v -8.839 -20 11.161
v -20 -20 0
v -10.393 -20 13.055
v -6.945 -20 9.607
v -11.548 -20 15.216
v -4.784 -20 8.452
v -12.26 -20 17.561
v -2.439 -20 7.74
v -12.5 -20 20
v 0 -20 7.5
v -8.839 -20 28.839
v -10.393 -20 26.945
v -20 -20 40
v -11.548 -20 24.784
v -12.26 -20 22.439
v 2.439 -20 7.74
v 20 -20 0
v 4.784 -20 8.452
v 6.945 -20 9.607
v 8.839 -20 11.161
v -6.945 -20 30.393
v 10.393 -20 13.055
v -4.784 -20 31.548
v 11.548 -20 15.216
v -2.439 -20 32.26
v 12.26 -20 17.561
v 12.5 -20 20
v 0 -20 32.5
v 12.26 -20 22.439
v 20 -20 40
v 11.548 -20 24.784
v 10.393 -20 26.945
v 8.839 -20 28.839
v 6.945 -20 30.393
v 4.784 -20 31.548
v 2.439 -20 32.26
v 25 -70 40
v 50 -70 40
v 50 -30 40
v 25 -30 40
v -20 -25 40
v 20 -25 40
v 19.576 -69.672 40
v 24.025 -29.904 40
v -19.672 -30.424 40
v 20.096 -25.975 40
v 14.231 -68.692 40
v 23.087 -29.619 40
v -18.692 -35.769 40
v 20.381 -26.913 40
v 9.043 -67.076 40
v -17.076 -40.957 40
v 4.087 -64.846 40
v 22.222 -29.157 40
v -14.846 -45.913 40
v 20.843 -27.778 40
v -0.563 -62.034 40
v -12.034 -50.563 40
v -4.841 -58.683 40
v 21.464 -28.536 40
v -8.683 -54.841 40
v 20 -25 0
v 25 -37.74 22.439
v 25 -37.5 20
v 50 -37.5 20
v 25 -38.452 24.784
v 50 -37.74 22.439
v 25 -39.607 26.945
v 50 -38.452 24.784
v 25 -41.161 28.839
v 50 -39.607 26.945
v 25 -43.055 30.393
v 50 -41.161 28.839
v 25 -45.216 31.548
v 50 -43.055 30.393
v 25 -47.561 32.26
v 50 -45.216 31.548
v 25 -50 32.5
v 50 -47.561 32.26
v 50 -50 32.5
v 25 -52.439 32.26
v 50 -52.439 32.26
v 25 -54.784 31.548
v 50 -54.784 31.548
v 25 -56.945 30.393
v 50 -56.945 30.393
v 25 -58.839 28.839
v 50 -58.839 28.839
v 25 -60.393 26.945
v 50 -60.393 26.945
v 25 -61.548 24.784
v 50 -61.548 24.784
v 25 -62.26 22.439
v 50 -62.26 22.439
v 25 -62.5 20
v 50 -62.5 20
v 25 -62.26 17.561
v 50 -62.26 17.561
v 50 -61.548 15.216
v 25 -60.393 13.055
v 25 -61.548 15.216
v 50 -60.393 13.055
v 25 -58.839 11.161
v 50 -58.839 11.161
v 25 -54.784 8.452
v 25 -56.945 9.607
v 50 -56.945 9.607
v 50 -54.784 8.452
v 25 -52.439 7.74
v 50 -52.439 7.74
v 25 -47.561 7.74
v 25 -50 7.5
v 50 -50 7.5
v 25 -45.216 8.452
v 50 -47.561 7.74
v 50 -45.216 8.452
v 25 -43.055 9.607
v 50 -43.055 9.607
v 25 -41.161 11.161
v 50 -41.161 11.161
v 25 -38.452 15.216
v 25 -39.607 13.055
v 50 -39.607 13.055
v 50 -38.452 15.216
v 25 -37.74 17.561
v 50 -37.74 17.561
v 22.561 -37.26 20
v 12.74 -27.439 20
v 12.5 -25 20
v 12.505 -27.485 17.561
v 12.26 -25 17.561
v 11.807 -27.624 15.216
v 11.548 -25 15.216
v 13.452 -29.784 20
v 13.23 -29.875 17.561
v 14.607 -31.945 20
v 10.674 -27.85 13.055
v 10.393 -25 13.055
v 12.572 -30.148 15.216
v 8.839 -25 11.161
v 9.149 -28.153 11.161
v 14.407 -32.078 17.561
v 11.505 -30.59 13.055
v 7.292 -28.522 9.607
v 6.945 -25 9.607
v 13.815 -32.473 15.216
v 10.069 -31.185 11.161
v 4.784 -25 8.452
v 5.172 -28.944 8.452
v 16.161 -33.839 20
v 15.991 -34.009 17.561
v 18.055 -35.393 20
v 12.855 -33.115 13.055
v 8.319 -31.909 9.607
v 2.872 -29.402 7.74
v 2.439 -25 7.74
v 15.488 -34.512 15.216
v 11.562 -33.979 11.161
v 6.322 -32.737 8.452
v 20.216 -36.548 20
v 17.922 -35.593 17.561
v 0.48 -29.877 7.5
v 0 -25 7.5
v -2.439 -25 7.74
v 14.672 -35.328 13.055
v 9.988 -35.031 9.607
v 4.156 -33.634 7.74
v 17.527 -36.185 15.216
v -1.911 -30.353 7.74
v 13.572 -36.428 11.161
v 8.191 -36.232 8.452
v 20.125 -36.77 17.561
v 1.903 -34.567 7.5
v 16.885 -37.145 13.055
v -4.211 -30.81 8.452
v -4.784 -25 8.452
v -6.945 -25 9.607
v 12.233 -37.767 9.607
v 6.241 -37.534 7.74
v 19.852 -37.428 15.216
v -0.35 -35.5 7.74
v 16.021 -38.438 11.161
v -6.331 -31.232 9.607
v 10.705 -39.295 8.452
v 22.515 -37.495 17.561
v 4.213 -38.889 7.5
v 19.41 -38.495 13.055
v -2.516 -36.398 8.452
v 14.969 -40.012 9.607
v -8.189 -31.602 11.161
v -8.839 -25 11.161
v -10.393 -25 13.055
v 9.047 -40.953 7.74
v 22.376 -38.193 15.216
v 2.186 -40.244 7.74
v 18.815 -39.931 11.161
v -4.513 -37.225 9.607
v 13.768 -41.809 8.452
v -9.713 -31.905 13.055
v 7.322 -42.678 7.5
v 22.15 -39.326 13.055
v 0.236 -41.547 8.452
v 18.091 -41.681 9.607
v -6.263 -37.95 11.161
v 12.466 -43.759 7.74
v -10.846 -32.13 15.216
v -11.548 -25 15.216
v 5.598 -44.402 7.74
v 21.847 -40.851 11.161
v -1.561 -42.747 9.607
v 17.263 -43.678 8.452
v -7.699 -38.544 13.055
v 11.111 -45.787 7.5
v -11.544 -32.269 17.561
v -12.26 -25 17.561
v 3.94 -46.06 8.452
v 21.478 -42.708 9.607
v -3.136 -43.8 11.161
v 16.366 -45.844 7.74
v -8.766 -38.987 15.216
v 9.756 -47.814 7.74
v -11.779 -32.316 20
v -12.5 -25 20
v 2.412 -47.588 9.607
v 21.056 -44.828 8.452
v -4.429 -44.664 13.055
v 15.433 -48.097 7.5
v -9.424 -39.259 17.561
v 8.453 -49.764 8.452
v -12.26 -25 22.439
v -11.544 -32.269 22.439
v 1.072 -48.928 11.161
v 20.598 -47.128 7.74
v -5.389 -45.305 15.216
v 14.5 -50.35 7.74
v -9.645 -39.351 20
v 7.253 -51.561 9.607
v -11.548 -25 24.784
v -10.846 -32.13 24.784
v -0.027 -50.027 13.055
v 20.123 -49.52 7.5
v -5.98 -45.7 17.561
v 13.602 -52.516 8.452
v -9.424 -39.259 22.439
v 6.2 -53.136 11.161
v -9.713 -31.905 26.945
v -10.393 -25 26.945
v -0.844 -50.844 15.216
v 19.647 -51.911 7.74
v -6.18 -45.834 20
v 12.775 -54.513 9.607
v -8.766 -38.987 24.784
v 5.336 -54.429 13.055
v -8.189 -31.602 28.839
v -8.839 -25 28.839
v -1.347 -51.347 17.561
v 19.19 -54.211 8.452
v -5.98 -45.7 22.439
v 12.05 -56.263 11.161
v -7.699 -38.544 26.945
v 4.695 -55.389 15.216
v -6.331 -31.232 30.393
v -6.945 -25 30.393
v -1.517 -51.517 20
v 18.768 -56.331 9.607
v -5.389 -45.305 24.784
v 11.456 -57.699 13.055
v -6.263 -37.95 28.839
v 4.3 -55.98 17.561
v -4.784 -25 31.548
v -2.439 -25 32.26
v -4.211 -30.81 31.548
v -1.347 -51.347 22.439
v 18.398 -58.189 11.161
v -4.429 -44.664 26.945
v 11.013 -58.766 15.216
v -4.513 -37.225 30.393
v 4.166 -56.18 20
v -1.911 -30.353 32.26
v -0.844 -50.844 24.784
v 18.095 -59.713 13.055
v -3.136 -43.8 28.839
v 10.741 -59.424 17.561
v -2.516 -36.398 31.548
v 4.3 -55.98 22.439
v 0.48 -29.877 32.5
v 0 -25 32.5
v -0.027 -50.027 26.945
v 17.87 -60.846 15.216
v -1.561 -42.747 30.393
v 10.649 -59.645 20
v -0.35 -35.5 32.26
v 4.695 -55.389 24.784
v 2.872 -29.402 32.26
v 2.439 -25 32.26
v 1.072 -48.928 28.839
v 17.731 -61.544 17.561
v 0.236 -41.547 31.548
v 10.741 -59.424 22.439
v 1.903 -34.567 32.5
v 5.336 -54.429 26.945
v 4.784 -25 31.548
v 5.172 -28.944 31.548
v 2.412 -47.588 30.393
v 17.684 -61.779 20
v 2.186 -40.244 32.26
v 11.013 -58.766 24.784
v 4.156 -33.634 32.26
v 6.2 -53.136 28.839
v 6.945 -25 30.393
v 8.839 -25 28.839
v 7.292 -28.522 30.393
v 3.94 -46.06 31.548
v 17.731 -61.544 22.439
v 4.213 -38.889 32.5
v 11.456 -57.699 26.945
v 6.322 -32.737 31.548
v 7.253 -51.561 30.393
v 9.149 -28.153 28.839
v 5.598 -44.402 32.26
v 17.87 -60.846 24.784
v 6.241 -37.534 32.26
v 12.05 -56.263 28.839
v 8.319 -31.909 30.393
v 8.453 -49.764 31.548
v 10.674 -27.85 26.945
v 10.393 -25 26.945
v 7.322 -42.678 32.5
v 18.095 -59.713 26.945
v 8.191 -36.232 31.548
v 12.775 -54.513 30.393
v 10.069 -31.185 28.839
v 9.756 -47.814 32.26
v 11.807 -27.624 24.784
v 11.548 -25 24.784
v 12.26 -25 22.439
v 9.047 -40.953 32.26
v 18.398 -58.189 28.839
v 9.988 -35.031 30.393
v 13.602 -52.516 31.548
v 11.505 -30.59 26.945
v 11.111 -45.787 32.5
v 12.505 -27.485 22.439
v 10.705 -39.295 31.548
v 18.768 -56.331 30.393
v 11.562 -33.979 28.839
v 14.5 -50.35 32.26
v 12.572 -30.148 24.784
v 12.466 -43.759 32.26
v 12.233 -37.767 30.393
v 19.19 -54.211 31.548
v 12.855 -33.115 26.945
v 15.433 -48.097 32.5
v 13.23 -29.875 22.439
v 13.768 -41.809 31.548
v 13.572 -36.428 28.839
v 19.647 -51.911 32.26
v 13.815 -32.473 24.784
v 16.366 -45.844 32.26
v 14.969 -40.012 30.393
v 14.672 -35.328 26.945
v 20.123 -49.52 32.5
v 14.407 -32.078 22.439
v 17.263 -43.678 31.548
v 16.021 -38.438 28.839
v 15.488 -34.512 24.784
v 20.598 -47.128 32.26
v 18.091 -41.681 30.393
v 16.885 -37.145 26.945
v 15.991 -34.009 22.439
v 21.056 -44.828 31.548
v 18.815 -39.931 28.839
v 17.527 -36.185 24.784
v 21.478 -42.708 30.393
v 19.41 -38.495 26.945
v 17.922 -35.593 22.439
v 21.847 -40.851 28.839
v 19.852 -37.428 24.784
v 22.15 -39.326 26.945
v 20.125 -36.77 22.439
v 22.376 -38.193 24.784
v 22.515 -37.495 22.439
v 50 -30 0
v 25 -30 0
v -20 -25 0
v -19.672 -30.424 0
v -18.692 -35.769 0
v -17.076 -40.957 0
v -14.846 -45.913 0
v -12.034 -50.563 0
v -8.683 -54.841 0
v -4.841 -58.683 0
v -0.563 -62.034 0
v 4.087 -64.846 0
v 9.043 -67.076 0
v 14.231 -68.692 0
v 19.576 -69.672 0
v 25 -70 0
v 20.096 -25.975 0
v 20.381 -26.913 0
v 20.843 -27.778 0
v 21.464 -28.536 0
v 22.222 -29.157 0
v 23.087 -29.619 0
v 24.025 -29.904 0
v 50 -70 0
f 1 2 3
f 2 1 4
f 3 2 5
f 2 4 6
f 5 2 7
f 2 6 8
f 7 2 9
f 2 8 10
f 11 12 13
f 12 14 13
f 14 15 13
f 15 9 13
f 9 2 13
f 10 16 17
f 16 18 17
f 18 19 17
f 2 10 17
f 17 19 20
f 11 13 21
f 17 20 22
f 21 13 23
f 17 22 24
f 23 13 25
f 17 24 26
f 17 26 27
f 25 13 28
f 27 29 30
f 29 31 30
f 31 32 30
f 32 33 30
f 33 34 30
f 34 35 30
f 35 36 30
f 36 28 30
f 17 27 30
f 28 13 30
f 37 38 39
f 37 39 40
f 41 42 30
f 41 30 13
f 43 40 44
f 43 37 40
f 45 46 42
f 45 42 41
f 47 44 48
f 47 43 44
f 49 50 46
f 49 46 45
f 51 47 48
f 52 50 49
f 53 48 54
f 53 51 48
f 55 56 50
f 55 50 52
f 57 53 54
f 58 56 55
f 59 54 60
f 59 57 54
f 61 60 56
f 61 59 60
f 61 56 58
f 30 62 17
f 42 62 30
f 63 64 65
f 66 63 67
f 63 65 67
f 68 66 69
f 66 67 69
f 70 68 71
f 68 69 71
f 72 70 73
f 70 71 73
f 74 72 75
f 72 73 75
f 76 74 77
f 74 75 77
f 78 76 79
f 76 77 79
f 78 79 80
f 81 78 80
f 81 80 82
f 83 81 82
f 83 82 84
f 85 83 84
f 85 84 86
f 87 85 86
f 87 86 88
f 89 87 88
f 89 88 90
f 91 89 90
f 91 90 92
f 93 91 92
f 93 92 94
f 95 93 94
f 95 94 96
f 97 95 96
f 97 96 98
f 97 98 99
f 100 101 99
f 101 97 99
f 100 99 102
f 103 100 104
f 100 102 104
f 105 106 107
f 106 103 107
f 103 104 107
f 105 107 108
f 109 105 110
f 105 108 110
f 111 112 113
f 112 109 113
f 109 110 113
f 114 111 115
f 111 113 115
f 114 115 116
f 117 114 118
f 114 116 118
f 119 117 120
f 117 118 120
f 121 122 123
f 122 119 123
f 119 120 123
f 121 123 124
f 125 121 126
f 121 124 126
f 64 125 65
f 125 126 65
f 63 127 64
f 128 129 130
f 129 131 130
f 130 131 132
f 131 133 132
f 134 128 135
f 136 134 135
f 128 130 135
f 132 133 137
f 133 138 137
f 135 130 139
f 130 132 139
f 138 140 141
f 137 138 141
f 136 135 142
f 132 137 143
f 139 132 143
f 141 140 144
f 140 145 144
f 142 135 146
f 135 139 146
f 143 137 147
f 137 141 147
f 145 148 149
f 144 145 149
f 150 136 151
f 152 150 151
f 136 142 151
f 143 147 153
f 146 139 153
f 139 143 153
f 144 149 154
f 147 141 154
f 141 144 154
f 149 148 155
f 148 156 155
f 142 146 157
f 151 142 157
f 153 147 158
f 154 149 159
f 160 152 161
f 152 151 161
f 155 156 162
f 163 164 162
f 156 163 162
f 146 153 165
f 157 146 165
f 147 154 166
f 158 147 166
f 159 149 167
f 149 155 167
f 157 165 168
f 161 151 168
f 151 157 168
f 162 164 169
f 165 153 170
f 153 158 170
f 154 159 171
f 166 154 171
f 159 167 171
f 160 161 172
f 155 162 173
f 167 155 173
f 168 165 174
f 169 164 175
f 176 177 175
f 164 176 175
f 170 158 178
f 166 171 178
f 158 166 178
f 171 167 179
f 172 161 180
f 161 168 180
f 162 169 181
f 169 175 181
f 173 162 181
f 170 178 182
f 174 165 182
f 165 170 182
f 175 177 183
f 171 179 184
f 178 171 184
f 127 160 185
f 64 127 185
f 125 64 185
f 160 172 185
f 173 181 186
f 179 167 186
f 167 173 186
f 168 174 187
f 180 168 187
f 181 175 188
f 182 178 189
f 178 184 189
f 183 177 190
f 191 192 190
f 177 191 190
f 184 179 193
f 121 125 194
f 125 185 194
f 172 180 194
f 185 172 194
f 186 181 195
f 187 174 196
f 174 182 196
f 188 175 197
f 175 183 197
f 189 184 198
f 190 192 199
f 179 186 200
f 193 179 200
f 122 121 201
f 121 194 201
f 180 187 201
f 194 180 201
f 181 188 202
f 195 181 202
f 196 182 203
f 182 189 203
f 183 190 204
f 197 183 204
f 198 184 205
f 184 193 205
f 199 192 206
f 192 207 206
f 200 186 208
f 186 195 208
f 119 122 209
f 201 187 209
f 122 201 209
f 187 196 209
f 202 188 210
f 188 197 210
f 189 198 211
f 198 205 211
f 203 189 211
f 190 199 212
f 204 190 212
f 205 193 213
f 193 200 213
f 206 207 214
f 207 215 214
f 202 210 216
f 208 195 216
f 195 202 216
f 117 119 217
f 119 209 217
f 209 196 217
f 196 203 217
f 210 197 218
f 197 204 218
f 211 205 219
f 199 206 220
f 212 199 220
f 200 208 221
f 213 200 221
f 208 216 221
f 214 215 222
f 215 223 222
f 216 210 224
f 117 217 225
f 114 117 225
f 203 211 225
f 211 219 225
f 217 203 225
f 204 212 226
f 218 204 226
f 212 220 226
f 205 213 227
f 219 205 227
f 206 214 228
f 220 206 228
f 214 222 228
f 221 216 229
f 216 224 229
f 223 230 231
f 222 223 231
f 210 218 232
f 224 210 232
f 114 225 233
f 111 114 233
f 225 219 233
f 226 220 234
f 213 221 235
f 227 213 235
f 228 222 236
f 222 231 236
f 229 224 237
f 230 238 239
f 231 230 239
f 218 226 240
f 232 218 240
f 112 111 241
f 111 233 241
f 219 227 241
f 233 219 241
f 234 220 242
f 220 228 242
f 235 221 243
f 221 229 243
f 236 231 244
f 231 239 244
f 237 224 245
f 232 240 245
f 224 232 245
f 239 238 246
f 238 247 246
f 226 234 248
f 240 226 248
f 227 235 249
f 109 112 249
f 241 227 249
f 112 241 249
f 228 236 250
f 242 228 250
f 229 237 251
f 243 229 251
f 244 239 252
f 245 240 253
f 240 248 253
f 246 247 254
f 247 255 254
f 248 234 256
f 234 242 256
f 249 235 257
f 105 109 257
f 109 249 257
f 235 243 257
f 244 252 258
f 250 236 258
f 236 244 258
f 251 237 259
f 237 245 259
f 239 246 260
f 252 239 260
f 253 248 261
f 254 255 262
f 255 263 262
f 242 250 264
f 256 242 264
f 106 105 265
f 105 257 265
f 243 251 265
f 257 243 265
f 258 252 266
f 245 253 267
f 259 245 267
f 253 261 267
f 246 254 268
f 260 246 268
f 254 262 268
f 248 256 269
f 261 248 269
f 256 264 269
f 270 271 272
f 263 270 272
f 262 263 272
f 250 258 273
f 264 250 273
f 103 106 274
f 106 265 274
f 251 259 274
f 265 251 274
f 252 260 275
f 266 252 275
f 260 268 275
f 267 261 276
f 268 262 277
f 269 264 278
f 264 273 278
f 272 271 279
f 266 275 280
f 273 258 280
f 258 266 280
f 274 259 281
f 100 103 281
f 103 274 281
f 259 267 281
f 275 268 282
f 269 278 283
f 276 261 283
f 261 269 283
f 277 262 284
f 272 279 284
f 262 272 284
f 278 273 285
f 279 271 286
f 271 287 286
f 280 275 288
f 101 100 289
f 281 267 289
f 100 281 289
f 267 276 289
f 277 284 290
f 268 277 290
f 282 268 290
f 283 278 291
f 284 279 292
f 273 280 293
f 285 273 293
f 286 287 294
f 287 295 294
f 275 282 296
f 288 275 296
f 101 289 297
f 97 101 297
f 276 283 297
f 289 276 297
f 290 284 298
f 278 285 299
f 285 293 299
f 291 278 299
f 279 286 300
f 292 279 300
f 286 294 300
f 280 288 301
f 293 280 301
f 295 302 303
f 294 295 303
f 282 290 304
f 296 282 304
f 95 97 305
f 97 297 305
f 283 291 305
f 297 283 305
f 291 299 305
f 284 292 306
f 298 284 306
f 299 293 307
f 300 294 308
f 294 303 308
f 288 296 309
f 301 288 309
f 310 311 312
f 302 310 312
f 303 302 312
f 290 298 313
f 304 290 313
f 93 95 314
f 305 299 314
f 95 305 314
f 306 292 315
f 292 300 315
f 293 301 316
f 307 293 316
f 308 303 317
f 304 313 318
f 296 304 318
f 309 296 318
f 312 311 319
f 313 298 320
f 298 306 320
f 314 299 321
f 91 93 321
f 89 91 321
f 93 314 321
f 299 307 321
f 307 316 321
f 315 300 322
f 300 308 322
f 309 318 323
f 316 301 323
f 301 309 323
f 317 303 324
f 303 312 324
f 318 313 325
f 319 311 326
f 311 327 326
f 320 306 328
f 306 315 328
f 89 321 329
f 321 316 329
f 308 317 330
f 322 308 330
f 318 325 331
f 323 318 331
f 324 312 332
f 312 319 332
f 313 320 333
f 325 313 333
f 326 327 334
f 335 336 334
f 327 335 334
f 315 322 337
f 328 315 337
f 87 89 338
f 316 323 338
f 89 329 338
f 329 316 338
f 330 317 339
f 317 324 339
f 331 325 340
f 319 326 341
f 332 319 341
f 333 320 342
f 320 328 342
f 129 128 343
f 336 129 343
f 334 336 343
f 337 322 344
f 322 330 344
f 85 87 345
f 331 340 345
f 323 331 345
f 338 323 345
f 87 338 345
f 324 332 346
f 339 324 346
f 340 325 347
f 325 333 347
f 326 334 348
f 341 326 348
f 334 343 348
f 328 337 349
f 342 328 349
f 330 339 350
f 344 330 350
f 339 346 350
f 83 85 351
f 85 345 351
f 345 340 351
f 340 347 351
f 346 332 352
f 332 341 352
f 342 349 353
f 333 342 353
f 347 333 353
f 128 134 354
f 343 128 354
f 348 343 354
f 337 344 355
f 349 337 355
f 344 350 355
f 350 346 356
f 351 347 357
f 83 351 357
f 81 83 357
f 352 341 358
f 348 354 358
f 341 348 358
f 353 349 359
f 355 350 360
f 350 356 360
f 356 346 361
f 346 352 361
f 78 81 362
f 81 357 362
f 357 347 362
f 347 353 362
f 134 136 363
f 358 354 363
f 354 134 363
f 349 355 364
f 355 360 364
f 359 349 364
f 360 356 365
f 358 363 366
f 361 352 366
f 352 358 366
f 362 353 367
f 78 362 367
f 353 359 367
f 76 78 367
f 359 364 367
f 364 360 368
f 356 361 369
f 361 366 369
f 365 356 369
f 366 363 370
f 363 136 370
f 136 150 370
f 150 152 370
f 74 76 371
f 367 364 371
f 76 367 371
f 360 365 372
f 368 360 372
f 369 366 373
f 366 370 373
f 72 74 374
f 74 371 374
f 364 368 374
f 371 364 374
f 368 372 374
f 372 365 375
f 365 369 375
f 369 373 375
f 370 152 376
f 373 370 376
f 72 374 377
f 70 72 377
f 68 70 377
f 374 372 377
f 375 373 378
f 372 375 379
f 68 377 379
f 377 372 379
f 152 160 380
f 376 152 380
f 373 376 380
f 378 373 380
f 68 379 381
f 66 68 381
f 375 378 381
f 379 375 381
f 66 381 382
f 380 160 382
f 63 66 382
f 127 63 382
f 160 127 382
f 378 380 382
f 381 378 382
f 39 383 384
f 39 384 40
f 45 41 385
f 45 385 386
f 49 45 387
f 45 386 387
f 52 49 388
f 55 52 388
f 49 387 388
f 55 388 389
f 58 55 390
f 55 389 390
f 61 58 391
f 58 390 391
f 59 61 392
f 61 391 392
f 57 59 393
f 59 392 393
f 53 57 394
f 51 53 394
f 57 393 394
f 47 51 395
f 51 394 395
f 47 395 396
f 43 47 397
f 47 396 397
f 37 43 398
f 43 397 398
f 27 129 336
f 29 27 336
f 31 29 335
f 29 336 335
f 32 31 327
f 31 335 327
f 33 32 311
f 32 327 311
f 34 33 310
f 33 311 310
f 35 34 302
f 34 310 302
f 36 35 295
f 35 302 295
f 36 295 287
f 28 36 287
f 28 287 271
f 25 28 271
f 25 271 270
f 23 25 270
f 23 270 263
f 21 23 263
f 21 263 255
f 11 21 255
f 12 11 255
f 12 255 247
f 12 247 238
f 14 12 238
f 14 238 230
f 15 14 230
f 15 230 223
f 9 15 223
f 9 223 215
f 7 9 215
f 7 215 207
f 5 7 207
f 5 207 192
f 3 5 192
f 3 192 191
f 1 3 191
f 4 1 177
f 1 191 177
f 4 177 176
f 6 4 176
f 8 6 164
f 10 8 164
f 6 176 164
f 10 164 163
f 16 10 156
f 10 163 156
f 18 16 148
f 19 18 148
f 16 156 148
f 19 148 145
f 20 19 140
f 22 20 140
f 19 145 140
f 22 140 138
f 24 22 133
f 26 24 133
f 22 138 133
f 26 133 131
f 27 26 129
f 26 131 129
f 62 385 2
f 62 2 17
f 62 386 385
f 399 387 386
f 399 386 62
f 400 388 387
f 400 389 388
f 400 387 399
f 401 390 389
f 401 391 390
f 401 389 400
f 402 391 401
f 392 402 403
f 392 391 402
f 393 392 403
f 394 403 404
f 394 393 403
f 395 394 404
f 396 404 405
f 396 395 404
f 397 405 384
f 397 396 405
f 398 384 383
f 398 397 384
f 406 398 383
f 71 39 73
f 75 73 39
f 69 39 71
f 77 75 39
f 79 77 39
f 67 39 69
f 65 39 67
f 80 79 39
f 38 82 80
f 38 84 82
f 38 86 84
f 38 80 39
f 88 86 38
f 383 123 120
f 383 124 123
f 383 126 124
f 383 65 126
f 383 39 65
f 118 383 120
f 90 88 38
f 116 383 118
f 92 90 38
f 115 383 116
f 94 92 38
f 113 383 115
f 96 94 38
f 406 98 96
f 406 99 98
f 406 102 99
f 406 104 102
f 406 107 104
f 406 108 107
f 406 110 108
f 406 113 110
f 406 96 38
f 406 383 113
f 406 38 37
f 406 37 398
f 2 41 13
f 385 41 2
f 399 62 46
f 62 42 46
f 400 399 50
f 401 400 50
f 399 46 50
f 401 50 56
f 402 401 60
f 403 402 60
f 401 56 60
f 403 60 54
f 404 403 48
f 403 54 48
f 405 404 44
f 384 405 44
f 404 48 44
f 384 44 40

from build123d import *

# Parameters (mm, degrees)
F0_W     = 40
F0_H     = 40
F0_R     = 12.5
F3_ANGLE = 90


with BuildPart() as f2:
    # F2: sweep along a path in F1
    with BuildLine(Plane.XZ) as f2_path:
        Line((0, 0), (0, 5))
        ThreePointArc((0, 5), (7.3223304703, 22.6776695297), (25, 30))
        Line((25, 30), (50, 30))
    # F0 (on Top) → F2 (sweep)
    with BuildSketch(Plane.XY):
        Rectangle(F0_W, F0_H)
        Circle(F0_R, mode=Mode.SUBTRACT)
    sweep(path=f2_path.line)


with BuildPart() as f2_1:
    # F3: moved
    add(f2.part.rotate(Axis((0, -20, 0), (1, 0, 0)), F3_ANGLE))


solid = f2_1.part
